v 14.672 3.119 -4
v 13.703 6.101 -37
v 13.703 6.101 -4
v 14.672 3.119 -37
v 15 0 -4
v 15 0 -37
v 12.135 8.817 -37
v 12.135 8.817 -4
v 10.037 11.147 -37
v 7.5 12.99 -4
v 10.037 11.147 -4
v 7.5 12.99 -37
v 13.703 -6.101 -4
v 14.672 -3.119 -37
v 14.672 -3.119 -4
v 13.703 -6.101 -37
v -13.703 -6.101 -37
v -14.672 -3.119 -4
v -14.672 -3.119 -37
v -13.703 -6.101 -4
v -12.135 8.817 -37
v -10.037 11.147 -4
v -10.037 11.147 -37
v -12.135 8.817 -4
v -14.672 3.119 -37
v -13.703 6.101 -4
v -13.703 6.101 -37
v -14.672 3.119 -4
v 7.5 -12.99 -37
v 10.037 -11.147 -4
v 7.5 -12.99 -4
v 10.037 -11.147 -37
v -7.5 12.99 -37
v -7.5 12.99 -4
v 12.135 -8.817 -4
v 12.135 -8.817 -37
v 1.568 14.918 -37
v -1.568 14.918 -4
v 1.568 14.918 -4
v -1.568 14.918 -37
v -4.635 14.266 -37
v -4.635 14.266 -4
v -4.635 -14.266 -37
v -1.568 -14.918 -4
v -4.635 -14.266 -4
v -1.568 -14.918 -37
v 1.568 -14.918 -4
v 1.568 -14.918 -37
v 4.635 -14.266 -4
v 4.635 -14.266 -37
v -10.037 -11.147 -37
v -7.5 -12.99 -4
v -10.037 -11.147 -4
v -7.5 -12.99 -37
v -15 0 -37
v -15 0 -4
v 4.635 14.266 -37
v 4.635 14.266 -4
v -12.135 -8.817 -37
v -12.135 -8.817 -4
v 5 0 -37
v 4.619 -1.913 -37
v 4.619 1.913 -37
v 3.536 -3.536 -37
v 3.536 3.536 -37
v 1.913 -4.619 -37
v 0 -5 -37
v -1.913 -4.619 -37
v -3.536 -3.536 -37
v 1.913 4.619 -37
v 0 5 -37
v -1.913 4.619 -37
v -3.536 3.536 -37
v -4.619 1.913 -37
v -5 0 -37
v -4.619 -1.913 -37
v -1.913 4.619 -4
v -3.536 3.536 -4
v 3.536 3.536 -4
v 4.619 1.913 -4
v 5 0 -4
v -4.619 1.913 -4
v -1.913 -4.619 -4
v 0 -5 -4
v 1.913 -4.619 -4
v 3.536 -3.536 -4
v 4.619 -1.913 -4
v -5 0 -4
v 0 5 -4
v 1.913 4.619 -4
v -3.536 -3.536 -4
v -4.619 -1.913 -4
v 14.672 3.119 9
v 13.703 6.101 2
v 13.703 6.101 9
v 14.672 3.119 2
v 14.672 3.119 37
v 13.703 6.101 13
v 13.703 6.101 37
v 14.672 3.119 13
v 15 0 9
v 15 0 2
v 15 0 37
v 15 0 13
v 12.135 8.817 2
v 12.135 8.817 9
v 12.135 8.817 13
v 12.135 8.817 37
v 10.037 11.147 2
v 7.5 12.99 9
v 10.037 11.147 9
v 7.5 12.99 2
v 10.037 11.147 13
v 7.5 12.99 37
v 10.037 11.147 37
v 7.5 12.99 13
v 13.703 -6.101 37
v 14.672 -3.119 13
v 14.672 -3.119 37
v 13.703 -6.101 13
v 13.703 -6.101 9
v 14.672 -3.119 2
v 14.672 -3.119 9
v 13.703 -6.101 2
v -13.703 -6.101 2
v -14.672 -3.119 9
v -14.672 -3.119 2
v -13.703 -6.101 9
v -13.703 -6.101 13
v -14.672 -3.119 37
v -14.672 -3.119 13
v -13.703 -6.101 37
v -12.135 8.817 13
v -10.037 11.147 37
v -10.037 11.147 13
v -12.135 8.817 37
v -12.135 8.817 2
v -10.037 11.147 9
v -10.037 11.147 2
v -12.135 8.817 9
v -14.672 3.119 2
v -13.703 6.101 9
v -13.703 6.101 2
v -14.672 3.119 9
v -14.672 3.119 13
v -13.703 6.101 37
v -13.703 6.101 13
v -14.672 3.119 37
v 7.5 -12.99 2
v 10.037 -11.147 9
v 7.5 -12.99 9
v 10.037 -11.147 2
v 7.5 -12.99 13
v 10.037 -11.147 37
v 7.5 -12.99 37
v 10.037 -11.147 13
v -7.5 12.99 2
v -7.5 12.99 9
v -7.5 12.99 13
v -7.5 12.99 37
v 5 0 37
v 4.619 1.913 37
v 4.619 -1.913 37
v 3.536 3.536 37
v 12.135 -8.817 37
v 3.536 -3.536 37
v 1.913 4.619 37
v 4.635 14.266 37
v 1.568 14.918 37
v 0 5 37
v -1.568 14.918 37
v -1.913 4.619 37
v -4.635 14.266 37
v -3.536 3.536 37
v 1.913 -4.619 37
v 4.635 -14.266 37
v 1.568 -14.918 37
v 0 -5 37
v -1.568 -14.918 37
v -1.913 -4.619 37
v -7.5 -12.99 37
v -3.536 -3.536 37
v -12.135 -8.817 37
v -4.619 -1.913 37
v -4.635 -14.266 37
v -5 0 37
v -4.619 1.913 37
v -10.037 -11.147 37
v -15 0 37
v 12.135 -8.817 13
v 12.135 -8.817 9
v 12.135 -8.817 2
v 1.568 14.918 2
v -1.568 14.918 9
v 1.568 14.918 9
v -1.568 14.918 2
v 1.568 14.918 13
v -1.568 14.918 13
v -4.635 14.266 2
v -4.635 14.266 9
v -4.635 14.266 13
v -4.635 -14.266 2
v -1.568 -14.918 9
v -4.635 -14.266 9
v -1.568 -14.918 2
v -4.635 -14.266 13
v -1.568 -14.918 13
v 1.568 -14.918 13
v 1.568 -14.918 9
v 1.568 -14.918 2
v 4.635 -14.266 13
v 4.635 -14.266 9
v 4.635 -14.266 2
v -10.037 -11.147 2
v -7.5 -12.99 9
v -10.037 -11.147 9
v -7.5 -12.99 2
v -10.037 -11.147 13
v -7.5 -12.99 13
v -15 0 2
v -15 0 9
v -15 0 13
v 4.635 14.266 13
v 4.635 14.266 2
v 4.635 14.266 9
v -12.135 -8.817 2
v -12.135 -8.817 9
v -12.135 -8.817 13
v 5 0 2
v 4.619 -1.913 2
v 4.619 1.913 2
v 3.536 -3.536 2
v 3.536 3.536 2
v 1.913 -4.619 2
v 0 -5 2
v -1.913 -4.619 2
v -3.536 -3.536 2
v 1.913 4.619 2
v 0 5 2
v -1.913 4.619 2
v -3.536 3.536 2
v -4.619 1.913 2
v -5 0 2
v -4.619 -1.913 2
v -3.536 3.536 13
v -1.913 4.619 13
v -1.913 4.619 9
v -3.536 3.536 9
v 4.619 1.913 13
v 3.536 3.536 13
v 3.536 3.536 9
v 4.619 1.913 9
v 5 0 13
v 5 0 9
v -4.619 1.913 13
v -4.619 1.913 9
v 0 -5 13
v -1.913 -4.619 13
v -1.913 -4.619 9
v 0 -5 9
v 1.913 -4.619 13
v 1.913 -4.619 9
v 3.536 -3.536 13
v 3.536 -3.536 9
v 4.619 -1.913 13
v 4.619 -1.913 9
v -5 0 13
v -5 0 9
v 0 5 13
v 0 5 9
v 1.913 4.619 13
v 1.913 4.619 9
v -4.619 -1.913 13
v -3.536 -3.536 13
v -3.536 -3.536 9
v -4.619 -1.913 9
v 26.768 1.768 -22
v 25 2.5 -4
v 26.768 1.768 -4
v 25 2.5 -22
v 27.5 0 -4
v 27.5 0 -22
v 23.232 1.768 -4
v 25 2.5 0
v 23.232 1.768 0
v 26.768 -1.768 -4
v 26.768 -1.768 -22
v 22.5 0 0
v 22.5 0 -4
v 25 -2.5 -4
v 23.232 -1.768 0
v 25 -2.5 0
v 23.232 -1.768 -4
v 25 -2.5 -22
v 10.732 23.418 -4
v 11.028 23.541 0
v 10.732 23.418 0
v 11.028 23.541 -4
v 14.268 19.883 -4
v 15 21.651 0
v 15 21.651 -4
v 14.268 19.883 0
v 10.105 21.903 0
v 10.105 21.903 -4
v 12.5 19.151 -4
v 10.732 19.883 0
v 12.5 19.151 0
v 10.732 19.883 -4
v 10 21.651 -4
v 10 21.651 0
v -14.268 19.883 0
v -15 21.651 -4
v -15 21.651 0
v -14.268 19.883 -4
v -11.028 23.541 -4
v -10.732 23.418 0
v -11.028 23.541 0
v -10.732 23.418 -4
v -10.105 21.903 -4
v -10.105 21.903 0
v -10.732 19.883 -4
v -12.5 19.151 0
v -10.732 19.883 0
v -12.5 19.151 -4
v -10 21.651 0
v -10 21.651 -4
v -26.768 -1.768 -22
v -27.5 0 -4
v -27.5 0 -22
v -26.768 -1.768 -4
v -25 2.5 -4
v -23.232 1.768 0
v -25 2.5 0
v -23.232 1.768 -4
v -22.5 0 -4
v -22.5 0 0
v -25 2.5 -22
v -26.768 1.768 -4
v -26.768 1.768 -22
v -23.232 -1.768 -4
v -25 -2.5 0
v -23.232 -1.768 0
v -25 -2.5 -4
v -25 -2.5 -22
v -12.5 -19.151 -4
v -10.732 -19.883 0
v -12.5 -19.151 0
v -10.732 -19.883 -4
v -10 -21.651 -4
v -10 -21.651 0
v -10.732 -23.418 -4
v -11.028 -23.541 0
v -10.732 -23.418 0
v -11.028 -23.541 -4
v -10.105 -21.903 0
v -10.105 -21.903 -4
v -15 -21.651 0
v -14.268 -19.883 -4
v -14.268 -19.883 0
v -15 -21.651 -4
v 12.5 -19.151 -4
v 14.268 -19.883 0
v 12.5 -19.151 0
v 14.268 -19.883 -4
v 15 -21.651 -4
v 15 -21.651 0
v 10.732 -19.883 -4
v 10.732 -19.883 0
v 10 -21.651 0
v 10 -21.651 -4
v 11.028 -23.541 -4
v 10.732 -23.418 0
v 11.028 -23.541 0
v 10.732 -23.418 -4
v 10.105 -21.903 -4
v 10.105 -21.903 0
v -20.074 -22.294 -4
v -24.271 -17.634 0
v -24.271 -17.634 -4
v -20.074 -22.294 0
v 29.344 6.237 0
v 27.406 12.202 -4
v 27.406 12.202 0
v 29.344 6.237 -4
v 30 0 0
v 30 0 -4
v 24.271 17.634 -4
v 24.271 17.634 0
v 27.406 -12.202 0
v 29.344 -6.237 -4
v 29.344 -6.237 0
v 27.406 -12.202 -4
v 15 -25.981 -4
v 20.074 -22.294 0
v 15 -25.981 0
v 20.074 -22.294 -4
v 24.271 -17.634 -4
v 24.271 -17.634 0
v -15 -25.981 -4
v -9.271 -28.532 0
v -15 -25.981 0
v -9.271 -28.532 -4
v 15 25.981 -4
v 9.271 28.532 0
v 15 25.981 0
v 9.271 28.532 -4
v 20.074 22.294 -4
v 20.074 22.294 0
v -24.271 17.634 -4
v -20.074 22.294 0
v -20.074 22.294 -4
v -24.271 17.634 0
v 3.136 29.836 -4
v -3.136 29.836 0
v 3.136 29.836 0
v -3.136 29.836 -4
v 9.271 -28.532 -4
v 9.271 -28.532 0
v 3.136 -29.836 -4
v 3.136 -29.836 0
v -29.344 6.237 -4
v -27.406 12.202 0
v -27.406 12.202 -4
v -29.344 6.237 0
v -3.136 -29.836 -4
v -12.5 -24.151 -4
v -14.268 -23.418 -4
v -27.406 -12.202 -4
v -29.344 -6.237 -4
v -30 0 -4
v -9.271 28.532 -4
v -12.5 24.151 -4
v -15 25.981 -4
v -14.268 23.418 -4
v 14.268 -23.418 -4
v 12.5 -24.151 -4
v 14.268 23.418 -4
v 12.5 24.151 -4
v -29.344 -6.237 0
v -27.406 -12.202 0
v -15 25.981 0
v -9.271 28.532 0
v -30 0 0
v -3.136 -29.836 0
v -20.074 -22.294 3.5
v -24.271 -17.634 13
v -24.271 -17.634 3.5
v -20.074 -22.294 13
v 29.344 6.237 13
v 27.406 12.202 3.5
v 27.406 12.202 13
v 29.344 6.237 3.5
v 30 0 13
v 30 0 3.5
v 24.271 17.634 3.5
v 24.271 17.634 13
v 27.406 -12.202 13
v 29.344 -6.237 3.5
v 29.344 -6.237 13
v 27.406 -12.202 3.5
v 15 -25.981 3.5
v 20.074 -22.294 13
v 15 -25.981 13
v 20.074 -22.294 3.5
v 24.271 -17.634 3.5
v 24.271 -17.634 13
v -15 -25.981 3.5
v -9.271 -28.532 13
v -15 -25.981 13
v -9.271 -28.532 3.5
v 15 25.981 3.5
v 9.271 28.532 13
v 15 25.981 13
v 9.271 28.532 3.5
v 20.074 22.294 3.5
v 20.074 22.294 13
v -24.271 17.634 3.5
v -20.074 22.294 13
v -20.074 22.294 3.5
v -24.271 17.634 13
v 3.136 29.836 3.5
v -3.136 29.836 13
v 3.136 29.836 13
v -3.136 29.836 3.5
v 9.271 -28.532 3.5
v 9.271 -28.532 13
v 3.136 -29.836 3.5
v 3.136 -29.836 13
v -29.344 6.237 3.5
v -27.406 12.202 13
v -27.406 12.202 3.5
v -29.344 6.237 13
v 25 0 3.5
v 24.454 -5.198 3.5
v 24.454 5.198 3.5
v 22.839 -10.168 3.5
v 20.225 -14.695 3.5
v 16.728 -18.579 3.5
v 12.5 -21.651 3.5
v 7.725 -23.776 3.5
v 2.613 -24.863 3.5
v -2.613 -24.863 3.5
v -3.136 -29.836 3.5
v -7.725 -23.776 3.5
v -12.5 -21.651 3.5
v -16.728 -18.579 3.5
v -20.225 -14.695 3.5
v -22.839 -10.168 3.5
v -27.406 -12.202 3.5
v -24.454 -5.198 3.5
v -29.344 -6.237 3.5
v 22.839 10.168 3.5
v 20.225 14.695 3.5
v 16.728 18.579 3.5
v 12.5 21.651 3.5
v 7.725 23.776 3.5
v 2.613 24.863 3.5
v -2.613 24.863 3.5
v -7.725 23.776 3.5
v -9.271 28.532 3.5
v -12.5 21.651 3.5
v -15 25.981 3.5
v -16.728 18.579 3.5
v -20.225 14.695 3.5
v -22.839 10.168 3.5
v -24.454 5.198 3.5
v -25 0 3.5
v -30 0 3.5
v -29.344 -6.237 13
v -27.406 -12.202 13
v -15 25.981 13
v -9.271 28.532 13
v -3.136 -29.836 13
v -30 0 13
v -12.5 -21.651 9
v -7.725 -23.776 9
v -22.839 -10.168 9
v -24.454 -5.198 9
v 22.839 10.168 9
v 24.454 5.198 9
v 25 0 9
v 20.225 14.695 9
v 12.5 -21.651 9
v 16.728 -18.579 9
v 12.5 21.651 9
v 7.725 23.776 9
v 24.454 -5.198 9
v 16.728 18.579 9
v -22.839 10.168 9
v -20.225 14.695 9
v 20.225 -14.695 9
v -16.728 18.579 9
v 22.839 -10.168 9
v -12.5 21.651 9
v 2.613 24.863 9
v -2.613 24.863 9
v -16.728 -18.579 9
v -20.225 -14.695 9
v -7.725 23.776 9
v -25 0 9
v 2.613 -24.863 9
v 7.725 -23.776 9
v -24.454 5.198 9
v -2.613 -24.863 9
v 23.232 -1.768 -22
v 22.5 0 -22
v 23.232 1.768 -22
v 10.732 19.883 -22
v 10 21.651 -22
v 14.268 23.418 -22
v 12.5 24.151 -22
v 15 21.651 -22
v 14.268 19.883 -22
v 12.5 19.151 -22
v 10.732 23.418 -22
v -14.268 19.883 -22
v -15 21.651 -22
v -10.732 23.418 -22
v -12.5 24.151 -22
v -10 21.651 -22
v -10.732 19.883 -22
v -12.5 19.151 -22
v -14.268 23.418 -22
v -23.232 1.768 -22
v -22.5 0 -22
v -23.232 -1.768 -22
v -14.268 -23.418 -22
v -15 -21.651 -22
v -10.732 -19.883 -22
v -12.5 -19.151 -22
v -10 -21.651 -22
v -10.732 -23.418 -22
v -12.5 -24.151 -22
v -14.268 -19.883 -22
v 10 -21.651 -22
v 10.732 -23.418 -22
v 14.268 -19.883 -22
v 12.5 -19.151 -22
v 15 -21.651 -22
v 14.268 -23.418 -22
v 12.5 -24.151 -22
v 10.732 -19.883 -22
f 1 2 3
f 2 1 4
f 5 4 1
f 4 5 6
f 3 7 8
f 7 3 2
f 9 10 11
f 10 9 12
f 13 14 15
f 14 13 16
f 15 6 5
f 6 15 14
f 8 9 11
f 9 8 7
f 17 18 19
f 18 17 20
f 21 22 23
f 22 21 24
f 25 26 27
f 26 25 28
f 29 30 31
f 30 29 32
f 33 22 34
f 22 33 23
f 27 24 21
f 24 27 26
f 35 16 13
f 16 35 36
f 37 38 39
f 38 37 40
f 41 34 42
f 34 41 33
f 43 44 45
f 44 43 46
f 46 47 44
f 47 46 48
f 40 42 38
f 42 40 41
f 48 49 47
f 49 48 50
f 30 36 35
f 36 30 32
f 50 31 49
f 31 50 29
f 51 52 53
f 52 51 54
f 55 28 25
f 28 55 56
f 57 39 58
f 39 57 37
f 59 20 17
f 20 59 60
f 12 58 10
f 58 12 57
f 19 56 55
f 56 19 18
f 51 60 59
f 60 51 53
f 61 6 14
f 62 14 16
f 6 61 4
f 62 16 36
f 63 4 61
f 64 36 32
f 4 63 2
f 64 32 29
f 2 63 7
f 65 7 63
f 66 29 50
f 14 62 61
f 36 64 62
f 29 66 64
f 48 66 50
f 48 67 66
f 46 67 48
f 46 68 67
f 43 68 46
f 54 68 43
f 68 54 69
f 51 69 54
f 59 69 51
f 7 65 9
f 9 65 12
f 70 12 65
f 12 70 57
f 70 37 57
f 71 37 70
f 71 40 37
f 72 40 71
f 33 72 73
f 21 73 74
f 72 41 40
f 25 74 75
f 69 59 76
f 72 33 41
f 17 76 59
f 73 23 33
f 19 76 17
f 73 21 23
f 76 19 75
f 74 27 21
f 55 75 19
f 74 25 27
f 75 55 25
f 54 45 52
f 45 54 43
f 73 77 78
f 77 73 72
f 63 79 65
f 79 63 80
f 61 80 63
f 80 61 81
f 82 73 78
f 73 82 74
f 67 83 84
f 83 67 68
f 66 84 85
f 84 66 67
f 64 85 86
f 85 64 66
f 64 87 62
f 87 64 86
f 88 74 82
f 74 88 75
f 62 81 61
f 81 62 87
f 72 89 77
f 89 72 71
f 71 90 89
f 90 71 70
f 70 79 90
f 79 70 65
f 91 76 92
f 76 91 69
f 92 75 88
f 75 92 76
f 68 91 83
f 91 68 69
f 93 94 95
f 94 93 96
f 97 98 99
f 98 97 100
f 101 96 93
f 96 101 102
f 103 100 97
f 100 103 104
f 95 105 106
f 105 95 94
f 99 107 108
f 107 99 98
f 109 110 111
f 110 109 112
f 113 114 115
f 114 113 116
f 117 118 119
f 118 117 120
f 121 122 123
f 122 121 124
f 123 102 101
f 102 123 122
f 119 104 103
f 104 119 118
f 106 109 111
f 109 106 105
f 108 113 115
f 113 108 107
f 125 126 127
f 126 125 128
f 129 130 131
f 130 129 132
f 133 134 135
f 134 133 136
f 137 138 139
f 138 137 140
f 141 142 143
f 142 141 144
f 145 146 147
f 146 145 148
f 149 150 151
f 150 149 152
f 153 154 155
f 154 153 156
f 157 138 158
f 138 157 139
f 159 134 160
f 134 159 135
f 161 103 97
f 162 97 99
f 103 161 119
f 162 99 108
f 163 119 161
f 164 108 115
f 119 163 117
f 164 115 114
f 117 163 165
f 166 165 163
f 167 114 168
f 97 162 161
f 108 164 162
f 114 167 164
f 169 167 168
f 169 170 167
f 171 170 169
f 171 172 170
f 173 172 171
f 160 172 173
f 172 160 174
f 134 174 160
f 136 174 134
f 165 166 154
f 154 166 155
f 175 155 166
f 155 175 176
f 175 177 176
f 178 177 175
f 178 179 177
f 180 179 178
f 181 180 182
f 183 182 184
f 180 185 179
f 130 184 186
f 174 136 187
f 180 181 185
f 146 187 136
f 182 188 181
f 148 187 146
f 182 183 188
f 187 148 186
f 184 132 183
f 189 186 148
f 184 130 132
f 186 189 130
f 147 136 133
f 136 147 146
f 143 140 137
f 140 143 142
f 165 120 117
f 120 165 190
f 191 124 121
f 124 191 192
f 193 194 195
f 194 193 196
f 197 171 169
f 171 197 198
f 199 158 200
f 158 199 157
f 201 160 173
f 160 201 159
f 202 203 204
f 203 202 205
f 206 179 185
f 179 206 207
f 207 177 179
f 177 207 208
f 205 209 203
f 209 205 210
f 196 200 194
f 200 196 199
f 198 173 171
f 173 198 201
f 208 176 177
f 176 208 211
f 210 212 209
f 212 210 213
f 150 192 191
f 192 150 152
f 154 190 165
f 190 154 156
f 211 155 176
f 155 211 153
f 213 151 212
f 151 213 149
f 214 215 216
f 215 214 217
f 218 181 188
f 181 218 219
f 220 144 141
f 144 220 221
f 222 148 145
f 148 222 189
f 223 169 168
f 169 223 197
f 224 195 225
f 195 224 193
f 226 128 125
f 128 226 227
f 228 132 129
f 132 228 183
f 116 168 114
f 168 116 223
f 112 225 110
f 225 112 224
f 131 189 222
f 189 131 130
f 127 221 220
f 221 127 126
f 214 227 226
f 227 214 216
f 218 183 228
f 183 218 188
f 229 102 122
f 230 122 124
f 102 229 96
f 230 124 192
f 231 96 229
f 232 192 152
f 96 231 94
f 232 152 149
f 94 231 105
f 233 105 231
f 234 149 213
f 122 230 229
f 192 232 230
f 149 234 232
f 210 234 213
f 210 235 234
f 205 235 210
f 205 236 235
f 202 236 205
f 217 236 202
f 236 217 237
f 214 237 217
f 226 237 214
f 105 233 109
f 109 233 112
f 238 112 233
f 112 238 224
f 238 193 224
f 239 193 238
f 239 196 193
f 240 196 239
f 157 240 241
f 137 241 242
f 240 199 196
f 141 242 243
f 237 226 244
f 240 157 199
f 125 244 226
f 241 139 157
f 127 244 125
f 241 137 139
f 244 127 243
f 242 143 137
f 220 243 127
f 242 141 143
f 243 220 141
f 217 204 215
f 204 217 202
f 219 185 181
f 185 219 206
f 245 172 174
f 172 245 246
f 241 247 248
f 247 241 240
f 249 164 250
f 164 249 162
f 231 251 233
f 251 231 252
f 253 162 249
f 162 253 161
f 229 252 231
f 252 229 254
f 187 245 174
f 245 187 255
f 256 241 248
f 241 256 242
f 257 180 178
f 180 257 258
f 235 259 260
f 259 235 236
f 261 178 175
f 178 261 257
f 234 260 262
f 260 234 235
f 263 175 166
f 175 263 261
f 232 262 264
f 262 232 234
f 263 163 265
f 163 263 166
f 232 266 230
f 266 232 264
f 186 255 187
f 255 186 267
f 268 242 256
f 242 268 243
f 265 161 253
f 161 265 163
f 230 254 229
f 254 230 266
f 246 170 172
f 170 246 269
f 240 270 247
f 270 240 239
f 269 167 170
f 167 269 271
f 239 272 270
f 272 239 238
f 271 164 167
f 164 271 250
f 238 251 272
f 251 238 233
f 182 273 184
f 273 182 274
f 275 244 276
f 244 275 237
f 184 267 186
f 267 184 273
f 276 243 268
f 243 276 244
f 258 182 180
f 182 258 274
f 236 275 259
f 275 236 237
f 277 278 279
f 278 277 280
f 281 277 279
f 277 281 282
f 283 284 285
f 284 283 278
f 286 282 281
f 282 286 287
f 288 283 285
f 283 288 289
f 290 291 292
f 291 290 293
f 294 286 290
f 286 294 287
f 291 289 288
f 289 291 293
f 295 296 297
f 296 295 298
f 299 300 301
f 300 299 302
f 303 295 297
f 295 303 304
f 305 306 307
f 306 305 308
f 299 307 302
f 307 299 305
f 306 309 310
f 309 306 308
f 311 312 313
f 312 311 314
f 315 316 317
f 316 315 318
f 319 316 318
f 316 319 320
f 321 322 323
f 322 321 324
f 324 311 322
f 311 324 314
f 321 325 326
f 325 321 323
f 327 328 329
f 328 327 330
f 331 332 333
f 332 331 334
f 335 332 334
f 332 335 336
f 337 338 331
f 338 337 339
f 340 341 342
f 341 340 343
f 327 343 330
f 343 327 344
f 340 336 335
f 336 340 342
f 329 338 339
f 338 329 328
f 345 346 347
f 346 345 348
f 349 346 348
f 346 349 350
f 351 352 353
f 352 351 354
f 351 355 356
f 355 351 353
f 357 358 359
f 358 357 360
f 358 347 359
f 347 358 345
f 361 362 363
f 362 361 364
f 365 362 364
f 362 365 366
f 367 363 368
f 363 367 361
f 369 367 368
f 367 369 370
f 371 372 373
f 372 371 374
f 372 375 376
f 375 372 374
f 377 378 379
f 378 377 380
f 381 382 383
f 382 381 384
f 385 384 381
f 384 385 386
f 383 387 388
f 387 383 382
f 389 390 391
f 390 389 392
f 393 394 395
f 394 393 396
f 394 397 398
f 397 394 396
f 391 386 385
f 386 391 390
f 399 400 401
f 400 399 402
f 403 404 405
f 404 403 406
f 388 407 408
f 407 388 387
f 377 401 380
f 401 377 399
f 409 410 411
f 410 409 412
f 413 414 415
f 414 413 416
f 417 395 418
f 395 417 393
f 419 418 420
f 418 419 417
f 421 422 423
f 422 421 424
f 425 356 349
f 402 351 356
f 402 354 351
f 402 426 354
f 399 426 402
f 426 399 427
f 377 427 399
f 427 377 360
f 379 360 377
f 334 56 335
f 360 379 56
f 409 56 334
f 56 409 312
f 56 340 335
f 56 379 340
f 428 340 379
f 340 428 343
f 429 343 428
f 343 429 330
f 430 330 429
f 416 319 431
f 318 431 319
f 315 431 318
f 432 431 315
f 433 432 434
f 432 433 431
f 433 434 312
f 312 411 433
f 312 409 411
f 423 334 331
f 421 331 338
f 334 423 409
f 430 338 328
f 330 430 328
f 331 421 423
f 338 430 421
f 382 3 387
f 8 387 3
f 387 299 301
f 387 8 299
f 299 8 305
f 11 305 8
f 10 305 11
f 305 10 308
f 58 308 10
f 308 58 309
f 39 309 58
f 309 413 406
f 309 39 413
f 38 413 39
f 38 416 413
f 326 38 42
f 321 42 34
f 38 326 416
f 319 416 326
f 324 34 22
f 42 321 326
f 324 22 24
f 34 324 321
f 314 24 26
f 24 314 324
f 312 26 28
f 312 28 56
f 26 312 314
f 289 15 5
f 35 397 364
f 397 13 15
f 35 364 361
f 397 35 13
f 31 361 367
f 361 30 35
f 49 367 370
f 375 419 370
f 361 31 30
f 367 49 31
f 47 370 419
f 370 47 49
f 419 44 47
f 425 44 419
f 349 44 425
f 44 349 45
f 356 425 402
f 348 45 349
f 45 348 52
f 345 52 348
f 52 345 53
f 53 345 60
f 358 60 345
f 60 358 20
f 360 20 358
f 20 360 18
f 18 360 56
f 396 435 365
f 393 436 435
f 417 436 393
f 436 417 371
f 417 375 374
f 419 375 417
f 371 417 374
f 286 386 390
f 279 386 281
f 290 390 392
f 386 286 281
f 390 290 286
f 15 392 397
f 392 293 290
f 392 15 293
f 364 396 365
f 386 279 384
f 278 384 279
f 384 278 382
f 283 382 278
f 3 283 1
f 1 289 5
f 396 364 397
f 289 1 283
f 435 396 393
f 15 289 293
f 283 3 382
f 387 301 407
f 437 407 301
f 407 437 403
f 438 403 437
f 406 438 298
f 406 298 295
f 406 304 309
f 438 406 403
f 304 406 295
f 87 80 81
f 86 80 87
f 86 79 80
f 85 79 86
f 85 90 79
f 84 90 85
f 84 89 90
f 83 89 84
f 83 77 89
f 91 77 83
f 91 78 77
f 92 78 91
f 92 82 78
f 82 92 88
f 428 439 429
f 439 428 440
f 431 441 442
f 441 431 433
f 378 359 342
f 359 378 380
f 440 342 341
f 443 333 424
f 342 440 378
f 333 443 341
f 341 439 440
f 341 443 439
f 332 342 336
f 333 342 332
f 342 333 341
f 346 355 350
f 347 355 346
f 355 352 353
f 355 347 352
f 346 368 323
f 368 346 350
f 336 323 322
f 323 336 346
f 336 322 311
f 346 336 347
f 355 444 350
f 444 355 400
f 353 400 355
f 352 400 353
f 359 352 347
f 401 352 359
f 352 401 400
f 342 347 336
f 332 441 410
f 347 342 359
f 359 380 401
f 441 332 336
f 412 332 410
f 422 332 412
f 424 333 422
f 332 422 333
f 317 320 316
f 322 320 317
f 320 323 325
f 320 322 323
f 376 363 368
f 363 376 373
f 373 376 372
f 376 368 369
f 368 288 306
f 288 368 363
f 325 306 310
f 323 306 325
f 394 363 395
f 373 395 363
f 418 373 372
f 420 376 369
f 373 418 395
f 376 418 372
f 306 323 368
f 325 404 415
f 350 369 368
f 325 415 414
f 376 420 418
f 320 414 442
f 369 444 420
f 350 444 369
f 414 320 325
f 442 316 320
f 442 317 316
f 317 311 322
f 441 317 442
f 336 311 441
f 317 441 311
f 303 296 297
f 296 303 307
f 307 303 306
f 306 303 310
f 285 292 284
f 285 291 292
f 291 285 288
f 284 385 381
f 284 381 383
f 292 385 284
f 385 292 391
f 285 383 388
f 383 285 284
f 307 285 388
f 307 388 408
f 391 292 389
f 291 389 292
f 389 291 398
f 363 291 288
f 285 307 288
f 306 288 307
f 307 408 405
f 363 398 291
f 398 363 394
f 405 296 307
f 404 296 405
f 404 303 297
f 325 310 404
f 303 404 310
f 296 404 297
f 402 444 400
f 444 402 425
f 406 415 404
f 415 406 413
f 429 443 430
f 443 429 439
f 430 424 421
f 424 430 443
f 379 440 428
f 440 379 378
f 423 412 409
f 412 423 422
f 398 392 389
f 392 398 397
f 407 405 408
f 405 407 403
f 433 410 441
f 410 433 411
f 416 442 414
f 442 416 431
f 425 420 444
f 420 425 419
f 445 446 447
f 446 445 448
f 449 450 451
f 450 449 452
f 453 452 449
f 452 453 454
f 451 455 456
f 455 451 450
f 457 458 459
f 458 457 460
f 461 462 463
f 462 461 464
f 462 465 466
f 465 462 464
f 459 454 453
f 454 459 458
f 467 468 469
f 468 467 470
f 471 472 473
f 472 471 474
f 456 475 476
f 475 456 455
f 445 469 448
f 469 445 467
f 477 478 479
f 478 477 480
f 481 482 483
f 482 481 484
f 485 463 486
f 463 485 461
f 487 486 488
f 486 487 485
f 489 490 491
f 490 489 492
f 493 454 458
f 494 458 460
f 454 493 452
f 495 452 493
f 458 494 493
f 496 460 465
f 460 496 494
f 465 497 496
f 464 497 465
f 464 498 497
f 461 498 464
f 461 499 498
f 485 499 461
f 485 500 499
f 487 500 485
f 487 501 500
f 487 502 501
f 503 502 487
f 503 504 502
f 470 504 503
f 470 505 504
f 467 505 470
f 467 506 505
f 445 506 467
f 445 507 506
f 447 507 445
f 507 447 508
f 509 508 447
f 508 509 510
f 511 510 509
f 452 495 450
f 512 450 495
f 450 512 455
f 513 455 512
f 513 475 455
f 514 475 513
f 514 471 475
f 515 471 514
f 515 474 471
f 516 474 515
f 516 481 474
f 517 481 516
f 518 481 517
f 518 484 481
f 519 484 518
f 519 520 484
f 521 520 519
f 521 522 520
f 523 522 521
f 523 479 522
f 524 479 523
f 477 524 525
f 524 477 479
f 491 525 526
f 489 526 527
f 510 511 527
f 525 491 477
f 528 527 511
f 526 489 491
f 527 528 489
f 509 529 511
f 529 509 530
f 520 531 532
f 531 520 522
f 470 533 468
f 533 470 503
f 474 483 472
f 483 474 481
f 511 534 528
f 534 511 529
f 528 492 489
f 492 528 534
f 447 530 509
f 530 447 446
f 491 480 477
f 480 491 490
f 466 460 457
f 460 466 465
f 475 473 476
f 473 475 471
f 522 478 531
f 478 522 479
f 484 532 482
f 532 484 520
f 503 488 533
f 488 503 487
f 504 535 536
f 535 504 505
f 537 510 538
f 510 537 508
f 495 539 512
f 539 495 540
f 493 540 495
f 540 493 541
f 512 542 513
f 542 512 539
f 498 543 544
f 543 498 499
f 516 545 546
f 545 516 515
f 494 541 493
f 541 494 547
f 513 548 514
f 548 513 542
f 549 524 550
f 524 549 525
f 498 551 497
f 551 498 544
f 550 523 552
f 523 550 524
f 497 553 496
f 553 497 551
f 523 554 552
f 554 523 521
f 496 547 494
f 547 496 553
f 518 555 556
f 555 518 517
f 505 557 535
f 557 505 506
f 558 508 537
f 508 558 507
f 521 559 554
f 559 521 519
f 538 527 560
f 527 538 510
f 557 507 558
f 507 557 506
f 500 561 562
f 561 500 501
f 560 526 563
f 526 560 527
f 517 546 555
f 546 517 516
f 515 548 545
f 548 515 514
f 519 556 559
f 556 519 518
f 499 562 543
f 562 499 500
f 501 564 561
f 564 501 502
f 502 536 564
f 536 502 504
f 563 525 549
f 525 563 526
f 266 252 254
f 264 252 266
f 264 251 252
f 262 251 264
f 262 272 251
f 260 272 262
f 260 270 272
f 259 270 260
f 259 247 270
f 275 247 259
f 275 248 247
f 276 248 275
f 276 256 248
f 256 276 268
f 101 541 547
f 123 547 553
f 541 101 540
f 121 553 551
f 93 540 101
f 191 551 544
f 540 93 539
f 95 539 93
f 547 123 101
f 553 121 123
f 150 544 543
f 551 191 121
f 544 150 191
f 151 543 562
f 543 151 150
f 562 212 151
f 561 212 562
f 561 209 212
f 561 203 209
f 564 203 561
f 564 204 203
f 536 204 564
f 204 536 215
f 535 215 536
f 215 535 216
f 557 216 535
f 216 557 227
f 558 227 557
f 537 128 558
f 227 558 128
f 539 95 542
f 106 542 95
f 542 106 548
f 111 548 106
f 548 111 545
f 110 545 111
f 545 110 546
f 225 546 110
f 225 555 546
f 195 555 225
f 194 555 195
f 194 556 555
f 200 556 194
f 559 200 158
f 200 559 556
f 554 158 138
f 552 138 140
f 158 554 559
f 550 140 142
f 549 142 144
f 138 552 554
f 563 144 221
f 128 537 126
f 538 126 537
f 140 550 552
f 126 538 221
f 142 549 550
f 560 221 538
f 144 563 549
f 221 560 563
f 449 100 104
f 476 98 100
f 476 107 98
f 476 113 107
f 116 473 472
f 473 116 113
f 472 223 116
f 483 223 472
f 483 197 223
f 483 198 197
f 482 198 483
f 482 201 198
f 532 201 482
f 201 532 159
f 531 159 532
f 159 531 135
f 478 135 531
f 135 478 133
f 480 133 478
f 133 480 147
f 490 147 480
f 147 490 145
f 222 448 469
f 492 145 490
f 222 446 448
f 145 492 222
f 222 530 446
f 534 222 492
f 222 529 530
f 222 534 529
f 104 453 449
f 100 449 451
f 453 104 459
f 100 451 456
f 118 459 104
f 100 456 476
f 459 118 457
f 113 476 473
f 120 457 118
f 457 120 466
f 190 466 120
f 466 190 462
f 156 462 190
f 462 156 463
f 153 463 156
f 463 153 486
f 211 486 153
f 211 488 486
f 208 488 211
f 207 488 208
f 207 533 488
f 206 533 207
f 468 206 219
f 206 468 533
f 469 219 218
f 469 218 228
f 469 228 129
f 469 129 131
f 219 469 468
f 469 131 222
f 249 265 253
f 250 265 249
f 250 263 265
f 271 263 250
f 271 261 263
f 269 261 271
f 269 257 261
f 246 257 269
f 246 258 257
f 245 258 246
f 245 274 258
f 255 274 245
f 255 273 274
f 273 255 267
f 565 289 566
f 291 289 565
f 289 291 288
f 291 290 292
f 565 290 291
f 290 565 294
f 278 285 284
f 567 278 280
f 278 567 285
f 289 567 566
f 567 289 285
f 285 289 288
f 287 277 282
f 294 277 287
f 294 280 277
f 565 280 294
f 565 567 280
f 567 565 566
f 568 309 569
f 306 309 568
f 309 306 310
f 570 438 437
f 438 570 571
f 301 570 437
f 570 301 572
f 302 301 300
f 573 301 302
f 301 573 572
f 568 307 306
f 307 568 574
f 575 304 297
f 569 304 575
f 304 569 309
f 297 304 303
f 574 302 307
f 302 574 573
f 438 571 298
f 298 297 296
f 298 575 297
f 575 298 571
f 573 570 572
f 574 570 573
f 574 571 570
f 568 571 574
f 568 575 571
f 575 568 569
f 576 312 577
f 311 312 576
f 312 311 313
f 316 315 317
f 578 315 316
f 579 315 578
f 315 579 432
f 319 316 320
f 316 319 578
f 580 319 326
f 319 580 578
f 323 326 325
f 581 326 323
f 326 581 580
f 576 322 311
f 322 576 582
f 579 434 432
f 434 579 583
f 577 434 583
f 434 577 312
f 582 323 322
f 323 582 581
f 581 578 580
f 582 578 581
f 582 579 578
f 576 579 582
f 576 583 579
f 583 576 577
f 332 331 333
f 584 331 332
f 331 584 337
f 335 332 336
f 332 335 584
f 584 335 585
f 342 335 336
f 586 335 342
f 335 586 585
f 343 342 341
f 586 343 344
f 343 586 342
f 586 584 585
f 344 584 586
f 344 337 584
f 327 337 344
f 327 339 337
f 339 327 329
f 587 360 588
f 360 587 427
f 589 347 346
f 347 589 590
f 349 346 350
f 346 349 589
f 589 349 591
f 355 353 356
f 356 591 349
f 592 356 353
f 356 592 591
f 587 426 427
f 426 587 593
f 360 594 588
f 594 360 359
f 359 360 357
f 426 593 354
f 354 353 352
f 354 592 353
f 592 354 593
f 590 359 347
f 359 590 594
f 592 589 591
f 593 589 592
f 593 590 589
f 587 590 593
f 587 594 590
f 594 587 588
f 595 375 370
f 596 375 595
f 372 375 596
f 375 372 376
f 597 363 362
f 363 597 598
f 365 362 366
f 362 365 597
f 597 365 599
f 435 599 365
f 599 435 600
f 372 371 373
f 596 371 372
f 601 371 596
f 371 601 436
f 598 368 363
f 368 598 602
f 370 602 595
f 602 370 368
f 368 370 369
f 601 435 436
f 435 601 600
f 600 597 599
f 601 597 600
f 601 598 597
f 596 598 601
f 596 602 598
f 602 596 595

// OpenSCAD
// Parameters
hub_diameter = 30;
hub_length = 35; 
shaft_hole_diameter = 10;
flange_diameter = 60;
flange_thickness = 4; 
bolt_hole_diameter = 5;
bolt_circle_diameter = 50;
spacer_thickness = 3; 
bolt_length = 22; 
bolt_diameter = 5;
nut_size = 8;
nut_thickness = 4;

// Function to create a hub with bolt holes and refined mounting hole
module hub() {
    difference() {
        cylinder(d=hub_diameter, h=hub_length, center=true);
        cylinder(d=shaft_hole_diameter, h=hub_length + 2, center=true);
        
        // Adding bolt holes to the hub
        for (i = [0:5]) {
            angle = i * 60;
            translate([bolt_circle_diameter/2 * cos(angle), bolt_circle_diameter/2 * sin(angle), 0])
                cylinder(d=bolt_hole_diameter, h=hub_length + 2, center=true);
        }
    }
}

// Function to create a flange plate with bolt holes
module flange_plate() {
    difference() {
        cylinder(d=flange_diameter, h=flange_thickness, center=true);
        for (i = [0:5]) {
            angle = i * 60;
            translate([bolt_circle_diameter/2 * cos(angle), bolt_circle_diameter/2 * sin(angle), 0])
                cylinder(d=bolt_hole_diameter, h=flange_thickness + 2, center=true);
        }
    }
}

// Function to create a spacer ring
module spacer_ring() {
    difference() {
        cylinder(d=flange_diameter, h=spacer_thickness, center=true);
        cylinder(d=bolt_circle_diameter, h=spacer_thickness + 2, center=true);
    }
}

// Function to create a bolt
module bolt() {
    translate([0, 0, -bolt_length/2])
        cylinder(d=bolt_diameter, h=bolt_length, center=true);
}

// Function to create a nut
module nut() {
    translate([0, 0, bolt_length/2])
        cylinder(d=nut_size, h=nut_thickness, center=true, $fn=6);
}

// Assembly
module coupling() {
    translate([0, 0, -hub_length/2 - flange_thickness/2])
        hub();
    
    translate([0, 0, hub_length/2 + flange_thickness/2])
        hub();
    
    translate([0, 0, -flange_thickness/2])
        flange_plate();
    
    translate([0, 0, flange_thickness/2 + spacer_thickness])
        spacer_ring();
    
    translate([0, 0, flange_thickness/2 + 2 * spacer_thickness])
        spacer_ring();
    
    translate([0, 0, flange_thickness/2 + 3 * spacer_thickness])
        flange_plate();
    
    for (i = [0:5]) {
        angle = i * 60;
        translate([bolt_circle_diameter/2 * cos(angle), bolt_circle_diameter/2 * sin(angle), 0]) {
            bolt();
            nut();
        }
    }
}

// Render the coupling
coupling();
